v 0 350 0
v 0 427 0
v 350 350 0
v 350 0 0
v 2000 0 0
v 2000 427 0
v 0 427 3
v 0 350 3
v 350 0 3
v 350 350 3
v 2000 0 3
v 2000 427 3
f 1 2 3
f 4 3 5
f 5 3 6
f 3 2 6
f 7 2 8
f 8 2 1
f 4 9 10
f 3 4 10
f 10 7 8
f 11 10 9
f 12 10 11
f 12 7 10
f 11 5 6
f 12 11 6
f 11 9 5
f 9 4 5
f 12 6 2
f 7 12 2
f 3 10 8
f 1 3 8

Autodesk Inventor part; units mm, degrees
ref_plane "YZ Plane" through (0, 0, 0) normal (1, 0, 0) x (0, 1, 0)
ref_plane "XZ Plane" through (0, 0, 0) normal (0, 1, 0) x (-1, 0, 0)
ref_plane "XY Plane" through (0, 0, 0) normal (0, 0, 1) x (1, 0, 0)
sketch "Sketch1" plane through (0, 0, 0) normal (0, 0, 1) x (1, 0, 0)
  line L0 (0, 0) -> (2000, 0)
  line L1 (2000, 0) -> (2000, 427)
  line L2 (2000, 427) -> (0, 427)
  line L3 (0, 427) -> (0, 0)
  dimension "d0" = 2000
  dimension "d1" = 427
extrude "Extrusion1" add sketch "Sketch1" along normal blind 3
sketch "Sketch2" plane through (0, 0, 3) normal (0, 0, 1) x (1, 0, 0)
  line L0 (0, 427) -> (0, 0) projected
  line L1 (0, 0) -> (350, 0)
  line L2 (350, 0) -> (350, 350)
  line L3 (350, 350) -> (0, 350)
  line L4 (0, 350) -> (0, 0)
  point P0 (0, 350)
  dimension "d4" = 350
  dimension "d5" = 350
extrude "Extrusion2" cut sketch "Sketch2" against normal blind 10
properties part number "cover back" material "Nylon 6/6"
